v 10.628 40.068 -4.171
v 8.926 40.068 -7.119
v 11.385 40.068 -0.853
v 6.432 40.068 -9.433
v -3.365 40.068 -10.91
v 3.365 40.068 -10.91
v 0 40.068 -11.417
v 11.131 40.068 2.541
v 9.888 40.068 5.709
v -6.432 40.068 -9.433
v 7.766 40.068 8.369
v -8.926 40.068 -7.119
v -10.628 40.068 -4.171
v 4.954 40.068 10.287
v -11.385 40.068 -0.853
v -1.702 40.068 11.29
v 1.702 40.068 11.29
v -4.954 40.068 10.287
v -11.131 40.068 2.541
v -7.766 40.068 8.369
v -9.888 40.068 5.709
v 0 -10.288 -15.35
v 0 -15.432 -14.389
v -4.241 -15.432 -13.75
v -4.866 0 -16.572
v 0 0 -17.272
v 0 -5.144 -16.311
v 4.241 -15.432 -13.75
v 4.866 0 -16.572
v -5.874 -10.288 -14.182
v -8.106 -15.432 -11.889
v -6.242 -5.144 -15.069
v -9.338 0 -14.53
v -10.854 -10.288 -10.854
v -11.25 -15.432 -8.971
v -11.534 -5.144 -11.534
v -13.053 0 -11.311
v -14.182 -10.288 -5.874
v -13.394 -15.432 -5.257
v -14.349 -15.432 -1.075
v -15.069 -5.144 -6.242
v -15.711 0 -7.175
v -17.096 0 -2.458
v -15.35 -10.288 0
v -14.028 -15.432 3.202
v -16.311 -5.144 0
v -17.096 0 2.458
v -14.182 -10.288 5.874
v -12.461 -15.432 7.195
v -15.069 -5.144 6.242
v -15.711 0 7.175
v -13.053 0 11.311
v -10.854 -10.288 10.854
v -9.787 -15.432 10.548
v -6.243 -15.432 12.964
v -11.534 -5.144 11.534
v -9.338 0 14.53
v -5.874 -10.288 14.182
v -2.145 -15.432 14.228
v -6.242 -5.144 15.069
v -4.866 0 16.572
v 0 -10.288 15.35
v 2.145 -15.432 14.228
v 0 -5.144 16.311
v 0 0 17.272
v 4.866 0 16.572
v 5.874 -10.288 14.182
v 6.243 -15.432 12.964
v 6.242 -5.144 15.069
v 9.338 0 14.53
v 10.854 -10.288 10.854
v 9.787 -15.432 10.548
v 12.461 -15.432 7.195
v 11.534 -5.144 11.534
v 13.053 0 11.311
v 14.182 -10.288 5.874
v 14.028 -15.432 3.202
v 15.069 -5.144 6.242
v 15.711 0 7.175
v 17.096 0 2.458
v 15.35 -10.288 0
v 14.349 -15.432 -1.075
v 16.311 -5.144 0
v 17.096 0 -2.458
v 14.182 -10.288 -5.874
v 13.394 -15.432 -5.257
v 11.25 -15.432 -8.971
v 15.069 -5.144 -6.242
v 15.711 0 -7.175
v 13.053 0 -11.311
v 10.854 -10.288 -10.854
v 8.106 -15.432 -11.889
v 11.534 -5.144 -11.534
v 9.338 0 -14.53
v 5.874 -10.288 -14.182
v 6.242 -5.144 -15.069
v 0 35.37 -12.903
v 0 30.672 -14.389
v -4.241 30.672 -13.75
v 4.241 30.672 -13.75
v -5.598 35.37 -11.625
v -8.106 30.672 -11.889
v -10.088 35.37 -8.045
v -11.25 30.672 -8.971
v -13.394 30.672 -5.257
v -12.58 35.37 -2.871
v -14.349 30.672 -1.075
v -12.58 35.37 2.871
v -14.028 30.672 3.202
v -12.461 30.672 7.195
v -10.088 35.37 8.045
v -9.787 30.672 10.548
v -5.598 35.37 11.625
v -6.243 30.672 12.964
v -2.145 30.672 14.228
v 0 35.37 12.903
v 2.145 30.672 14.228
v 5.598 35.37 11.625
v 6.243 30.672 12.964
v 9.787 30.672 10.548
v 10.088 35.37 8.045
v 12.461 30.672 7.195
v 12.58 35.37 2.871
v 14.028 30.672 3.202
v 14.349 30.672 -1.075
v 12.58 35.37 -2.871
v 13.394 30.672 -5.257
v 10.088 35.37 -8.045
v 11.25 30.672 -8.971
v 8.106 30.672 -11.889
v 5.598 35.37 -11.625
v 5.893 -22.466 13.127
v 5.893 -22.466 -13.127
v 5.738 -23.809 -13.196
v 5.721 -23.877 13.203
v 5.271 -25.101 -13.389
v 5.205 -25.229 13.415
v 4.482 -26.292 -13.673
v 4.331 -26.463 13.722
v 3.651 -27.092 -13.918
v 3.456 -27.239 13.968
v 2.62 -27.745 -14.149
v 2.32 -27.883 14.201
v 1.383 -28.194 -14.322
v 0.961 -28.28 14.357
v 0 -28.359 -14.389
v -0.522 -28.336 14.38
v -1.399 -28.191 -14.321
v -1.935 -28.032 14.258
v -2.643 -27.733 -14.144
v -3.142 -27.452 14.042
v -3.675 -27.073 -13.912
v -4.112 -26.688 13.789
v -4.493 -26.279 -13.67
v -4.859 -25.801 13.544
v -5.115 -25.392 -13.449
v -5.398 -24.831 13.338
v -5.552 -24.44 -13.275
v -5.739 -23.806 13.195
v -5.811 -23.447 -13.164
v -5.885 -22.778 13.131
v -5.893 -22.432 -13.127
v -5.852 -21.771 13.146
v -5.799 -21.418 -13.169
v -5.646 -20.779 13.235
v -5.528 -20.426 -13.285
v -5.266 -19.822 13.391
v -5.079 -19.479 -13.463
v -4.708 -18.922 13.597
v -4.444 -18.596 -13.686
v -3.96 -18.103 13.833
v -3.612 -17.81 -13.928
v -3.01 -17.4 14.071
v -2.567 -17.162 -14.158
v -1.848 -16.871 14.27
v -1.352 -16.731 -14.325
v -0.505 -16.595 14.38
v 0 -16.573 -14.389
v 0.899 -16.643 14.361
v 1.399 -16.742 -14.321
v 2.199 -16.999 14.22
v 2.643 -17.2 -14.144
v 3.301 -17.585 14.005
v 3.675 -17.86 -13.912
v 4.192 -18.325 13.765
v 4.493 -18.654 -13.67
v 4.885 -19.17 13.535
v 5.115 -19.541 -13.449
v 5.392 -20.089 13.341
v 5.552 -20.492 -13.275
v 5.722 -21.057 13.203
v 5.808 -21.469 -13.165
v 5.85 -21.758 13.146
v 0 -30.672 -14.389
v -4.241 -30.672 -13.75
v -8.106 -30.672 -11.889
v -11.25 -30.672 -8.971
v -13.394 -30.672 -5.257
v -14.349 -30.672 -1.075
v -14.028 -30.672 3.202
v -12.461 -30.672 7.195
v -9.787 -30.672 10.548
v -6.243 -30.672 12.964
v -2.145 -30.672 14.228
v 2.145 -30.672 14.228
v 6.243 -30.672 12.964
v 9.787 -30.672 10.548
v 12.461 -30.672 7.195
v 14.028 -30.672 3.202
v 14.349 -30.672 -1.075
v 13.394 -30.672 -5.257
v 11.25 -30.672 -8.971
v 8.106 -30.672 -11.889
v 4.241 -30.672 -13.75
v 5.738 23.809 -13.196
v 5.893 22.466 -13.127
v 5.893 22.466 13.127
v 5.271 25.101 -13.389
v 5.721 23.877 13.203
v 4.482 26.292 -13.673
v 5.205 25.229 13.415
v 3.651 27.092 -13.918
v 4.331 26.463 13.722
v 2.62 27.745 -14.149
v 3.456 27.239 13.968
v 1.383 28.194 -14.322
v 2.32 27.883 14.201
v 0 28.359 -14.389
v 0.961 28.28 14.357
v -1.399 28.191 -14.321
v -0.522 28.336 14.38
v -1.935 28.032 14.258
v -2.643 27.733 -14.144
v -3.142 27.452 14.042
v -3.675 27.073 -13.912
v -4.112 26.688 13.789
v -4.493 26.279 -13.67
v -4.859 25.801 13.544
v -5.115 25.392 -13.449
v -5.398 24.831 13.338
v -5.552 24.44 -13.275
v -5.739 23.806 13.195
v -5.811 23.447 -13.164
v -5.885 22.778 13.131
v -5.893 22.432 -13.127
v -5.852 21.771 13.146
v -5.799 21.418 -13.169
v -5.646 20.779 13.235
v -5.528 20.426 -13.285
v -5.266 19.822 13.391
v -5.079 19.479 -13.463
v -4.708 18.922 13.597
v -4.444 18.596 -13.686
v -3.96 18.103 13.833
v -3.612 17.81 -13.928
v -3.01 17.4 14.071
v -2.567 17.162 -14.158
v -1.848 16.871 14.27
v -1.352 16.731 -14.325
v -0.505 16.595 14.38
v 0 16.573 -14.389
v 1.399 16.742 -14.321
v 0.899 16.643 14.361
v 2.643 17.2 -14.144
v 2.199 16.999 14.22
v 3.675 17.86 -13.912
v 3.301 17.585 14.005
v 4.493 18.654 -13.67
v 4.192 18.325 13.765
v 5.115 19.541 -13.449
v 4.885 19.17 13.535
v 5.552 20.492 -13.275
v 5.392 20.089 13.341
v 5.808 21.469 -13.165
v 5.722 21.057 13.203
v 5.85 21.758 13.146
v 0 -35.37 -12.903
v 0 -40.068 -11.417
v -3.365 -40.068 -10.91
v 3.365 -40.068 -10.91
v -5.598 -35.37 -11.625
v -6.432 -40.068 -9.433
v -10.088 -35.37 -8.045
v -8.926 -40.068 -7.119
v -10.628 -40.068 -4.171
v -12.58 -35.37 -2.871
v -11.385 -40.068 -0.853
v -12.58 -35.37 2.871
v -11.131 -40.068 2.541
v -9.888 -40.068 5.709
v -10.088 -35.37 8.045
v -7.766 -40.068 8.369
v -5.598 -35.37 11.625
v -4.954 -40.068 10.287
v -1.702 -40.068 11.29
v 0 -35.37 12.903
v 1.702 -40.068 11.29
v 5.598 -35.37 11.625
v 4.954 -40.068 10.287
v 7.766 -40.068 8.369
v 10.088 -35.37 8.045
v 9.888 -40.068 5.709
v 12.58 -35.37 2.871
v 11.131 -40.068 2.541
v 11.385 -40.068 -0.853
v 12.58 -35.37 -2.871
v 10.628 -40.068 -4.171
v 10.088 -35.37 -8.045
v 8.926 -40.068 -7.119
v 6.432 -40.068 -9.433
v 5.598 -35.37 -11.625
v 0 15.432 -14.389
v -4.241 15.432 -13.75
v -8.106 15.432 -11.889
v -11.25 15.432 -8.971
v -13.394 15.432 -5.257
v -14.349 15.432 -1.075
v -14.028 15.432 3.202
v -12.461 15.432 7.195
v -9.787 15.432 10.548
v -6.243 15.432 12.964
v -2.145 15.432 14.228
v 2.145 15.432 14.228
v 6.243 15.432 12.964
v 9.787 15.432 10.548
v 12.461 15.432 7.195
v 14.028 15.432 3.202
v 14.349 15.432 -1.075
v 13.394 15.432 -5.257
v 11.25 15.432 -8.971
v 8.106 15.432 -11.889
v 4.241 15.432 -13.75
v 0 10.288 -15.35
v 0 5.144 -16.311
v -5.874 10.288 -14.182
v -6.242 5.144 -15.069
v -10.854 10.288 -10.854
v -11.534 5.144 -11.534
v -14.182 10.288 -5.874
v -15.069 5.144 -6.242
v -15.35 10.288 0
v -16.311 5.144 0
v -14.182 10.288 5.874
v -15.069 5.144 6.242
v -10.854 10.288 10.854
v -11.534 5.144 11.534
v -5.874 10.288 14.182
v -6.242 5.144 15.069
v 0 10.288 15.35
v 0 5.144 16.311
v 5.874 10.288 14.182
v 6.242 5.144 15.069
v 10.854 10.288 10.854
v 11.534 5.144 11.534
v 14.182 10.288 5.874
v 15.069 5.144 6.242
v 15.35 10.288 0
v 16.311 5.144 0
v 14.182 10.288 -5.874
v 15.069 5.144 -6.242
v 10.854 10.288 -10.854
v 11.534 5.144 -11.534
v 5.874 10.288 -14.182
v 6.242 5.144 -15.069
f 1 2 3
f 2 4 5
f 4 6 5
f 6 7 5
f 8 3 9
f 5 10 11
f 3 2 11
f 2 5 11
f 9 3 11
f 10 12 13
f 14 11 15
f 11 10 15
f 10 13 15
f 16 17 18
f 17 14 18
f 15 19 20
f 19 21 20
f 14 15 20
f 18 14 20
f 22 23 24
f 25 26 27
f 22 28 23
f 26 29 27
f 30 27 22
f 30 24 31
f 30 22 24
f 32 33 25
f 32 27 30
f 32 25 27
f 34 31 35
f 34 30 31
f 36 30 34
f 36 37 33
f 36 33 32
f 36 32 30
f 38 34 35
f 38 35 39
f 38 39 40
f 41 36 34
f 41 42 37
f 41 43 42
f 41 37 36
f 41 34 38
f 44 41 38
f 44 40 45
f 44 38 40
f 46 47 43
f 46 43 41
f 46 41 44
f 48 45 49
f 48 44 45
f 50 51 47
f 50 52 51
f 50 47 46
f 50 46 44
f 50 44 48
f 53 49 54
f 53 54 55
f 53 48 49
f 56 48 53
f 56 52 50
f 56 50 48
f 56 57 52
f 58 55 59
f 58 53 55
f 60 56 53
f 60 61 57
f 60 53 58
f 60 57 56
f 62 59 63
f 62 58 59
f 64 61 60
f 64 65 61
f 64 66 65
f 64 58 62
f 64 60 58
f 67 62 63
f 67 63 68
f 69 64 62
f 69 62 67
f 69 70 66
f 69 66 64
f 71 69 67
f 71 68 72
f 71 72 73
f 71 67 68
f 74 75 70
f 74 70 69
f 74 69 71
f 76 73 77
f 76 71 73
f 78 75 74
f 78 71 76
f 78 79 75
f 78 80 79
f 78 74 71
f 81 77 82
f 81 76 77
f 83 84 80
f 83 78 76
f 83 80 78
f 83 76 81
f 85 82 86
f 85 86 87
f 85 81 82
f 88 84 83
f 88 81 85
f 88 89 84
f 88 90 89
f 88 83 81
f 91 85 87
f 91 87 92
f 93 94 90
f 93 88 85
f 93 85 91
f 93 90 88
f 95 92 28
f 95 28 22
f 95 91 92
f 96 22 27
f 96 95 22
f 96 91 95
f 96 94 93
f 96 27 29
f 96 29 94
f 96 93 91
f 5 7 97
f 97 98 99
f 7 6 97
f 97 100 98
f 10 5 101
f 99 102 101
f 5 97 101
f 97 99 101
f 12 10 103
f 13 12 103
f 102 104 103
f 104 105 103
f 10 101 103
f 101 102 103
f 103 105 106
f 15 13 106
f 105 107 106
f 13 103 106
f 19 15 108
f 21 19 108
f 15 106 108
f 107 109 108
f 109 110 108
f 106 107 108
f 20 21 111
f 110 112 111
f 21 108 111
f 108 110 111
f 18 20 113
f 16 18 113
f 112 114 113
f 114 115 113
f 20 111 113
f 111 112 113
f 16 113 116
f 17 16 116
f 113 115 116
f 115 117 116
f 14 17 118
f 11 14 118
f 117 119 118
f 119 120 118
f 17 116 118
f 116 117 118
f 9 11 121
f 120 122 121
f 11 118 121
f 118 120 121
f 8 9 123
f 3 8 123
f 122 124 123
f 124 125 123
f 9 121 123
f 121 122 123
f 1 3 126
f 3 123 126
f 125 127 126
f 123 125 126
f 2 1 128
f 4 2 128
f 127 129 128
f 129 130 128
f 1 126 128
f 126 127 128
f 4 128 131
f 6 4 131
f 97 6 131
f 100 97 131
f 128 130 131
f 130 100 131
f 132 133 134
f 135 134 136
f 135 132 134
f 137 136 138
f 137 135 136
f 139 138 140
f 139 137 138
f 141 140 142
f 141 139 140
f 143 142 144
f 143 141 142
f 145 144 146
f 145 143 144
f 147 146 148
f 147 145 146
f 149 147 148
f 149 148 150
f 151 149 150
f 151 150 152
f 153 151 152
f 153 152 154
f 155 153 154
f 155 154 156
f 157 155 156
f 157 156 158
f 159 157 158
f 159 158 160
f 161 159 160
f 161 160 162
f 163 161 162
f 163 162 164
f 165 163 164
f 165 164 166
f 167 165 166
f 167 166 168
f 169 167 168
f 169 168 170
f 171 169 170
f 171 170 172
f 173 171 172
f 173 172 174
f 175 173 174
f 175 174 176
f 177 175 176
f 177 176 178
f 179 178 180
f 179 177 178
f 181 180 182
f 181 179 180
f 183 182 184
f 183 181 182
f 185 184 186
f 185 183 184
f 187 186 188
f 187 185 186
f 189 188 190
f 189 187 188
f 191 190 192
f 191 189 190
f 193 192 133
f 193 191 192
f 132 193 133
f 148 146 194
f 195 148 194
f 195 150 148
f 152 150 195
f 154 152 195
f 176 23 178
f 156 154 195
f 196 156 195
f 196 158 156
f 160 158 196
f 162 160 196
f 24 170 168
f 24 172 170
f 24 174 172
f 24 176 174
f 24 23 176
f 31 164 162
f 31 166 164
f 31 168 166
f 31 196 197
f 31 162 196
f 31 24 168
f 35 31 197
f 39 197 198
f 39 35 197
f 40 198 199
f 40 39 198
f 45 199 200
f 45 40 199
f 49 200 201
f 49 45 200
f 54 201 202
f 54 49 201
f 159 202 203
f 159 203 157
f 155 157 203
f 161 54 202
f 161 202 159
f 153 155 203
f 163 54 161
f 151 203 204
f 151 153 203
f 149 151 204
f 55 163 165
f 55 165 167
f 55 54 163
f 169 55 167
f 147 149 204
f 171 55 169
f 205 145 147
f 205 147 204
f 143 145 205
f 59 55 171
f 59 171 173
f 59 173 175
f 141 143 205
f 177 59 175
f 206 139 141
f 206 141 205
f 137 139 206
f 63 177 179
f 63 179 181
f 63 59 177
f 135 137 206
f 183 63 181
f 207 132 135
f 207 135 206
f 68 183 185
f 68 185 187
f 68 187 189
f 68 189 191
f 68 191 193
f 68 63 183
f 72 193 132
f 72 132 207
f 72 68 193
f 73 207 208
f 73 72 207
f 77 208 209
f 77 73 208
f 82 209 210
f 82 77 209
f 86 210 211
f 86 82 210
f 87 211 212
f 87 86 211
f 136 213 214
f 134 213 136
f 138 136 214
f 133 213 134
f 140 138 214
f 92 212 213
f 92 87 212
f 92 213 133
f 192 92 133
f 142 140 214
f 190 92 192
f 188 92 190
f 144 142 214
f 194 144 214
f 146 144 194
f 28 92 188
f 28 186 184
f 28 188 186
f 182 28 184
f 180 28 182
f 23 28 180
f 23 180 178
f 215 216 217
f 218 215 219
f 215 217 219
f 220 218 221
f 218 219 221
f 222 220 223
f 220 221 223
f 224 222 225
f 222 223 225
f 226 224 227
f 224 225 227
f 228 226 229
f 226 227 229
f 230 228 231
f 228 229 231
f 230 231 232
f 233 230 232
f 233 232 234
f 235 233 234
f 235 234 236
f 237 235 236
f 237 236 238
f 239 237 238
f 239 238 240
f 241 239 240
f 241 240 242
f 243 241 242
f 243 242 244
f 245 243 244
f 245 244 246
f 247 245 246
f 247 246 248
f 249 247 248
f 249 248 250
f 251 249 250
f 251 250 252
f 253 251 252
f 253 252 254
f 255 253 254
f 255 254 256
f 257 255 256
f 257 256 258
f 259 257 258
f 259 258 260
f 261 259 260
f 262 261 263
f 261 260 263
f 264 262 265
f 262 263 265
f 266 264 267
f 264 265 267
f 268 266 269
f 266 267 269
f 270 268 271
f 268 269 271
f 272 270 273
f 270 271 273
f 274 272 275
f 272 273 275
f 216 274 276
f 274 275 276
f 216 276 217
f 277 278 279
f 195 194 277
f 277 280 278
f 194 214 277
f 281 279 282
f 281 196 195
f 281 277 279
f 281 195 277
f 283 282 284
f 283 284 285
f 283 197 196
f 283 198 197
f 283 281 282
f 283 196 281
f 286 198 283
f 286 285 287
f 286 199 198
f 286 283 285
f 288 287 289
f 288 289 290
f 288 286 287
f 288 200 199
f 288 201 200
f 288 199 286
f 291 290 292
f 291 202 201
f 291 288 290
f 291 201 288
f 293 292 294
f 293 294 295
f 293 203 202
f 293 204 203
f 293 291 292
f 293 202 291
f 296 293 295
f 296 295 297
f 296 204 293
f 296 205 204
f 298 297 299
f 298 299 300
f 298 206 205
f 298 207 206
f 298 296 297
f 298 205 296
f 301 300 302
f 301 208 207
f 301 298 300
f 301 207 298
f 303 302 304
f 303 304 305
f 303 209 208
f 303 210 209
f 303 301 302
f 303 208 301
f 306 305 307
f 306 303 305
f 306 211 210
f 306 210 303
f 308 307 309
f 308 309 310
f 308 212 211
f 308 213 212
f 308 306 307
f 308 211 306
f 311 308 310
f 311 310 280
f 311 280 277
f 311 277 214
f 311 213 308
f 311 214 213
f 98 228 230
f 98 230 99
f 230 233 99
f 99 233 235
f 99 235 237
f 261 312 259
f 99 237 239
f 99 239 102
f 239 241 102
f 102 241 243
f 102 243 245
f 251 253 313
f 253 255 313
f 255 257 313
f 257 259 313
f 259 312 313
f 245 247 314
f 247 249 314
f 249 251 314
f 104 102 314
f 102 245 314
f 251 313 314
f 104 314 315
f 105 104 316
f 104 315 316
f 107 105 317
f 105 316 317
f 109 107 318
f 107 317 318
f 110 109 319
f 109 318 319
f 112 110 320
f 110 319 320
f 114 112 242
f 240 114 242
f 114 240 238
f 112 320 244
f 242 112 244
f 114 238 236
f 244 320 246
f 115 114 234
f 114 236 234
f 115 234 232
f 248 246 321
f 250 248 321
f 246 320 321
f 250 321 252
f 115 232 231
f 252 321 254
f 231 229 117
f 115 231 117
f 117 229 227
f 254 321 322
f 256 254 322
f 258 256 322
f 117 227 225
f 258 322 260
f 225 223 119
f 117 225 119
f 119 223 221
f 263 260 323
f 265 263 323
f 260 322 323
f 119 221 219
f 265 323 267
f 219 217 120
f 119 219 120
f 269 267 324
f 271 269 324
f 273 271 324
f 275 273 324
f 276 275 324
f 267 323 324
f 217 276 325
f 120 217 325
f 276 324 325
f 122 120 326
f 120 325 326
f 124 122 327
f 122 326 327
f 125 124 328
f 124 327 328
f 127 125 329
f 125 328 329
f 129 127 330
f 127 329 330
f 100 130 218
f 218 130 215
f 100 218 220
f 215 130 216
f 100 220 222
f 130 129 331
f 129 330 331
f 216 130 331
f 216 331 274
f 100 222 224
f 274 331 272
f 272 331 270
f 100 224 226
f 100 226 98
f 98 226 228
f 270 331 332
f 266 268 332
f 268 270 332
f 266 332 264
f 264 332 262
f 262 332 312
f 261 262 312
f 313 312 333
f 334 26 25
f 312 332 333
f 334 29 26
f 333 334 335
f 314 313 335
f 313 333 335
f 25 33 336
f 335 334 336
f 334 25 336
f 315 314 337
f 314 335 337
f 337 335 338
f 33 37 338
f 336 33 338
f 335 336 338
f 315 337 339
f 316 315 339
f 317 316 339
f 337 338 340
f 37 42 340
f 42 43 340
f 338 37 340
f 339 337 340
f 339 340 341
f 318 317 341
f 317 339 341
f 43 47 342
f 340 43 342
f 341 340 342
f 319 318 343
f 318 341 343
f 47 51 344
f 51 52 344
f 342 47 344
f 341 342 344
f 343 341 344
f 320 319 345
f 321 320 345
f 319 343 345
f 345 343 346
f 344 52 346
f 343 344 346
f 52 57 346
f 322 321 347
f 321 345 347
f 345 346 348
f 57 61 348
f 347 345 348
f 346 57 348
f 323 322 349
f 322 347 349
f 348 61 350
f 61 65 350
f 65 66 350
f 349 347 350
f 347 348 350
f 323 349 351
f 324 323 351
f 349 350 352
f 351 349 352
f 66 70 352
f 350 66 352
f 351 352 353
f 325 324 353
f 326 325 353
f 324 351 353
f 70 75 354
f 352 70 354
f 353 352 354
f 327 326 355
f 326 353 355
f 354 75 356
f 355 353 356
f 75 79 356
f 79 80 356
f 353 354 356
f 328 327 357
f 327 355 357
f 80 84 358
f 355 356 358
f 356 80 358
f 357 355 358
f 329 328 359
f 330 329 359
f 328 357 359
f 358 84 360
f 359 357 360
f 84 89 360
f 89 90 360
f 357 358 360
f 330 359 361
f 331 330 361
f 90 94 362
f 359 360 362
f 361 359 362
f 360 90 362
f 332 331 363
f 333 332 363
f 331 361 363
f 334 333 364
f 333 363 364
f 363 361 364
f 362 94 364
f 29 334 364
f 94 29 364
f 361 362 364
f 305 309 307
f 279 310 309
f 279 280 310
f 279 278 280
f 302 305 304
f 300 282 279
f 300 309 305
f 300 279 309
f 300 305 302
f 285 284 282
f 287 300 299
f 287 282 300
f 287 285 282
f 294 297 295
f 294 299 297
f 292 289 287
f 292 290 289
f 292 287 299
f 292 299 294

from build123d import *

# Parameters (mm, degrees)
SKETCH2_R          = 5.8928
CUT_EXTRUDE1_DEPTH = 47.926843706


with BuildPart() as part:
    # Sketch1 → Revolve1 (revolve)
    with BuildSketch(Plane.XY, mode=Mode.PRIVATE) as revolve1_sk:
        Polygon((0, 0), (0, 40.0685), (11.4173, 40.0685), (14.3891, 30.672044722), (14.3891, 15.432044722), (17.272, 0), align=None)
    revolve1 = revolve(revolve1_sk.sketch.rotate(Axis((0, 0, 0), (0, 1, 0)), 90), axis=Axis((0, 0, 0), (0, 1, 0)))

    # Sketch2 → Cut-Extrude1 (cut, symmetric)
    with BuildSketch(Plane.XY):
        with Locations((0, 22.4663)):
            Circle(SKETCH2_R)
    cut_extrude1 = extrude(amount=CUT_EXTRUDE1_DEPTH, both=True, mode=Mode.SUBTRACT)

    # Mirror1: Revolve1, Cut-Extrude1 across plane
    add(revolve1.mirror(Plane(origin=(17.272, 0, 0), x_dir=(0, 0, 1), z_dir=(0, -1, 0))))
    add(cut_extrude1.mirror(Plane(origin=(17.272, 0, 0), x_dir=(0, 0, 1), z_dir=(0, -1, 0))), mode=Mode.SUBTRACT)


solid = part.part
